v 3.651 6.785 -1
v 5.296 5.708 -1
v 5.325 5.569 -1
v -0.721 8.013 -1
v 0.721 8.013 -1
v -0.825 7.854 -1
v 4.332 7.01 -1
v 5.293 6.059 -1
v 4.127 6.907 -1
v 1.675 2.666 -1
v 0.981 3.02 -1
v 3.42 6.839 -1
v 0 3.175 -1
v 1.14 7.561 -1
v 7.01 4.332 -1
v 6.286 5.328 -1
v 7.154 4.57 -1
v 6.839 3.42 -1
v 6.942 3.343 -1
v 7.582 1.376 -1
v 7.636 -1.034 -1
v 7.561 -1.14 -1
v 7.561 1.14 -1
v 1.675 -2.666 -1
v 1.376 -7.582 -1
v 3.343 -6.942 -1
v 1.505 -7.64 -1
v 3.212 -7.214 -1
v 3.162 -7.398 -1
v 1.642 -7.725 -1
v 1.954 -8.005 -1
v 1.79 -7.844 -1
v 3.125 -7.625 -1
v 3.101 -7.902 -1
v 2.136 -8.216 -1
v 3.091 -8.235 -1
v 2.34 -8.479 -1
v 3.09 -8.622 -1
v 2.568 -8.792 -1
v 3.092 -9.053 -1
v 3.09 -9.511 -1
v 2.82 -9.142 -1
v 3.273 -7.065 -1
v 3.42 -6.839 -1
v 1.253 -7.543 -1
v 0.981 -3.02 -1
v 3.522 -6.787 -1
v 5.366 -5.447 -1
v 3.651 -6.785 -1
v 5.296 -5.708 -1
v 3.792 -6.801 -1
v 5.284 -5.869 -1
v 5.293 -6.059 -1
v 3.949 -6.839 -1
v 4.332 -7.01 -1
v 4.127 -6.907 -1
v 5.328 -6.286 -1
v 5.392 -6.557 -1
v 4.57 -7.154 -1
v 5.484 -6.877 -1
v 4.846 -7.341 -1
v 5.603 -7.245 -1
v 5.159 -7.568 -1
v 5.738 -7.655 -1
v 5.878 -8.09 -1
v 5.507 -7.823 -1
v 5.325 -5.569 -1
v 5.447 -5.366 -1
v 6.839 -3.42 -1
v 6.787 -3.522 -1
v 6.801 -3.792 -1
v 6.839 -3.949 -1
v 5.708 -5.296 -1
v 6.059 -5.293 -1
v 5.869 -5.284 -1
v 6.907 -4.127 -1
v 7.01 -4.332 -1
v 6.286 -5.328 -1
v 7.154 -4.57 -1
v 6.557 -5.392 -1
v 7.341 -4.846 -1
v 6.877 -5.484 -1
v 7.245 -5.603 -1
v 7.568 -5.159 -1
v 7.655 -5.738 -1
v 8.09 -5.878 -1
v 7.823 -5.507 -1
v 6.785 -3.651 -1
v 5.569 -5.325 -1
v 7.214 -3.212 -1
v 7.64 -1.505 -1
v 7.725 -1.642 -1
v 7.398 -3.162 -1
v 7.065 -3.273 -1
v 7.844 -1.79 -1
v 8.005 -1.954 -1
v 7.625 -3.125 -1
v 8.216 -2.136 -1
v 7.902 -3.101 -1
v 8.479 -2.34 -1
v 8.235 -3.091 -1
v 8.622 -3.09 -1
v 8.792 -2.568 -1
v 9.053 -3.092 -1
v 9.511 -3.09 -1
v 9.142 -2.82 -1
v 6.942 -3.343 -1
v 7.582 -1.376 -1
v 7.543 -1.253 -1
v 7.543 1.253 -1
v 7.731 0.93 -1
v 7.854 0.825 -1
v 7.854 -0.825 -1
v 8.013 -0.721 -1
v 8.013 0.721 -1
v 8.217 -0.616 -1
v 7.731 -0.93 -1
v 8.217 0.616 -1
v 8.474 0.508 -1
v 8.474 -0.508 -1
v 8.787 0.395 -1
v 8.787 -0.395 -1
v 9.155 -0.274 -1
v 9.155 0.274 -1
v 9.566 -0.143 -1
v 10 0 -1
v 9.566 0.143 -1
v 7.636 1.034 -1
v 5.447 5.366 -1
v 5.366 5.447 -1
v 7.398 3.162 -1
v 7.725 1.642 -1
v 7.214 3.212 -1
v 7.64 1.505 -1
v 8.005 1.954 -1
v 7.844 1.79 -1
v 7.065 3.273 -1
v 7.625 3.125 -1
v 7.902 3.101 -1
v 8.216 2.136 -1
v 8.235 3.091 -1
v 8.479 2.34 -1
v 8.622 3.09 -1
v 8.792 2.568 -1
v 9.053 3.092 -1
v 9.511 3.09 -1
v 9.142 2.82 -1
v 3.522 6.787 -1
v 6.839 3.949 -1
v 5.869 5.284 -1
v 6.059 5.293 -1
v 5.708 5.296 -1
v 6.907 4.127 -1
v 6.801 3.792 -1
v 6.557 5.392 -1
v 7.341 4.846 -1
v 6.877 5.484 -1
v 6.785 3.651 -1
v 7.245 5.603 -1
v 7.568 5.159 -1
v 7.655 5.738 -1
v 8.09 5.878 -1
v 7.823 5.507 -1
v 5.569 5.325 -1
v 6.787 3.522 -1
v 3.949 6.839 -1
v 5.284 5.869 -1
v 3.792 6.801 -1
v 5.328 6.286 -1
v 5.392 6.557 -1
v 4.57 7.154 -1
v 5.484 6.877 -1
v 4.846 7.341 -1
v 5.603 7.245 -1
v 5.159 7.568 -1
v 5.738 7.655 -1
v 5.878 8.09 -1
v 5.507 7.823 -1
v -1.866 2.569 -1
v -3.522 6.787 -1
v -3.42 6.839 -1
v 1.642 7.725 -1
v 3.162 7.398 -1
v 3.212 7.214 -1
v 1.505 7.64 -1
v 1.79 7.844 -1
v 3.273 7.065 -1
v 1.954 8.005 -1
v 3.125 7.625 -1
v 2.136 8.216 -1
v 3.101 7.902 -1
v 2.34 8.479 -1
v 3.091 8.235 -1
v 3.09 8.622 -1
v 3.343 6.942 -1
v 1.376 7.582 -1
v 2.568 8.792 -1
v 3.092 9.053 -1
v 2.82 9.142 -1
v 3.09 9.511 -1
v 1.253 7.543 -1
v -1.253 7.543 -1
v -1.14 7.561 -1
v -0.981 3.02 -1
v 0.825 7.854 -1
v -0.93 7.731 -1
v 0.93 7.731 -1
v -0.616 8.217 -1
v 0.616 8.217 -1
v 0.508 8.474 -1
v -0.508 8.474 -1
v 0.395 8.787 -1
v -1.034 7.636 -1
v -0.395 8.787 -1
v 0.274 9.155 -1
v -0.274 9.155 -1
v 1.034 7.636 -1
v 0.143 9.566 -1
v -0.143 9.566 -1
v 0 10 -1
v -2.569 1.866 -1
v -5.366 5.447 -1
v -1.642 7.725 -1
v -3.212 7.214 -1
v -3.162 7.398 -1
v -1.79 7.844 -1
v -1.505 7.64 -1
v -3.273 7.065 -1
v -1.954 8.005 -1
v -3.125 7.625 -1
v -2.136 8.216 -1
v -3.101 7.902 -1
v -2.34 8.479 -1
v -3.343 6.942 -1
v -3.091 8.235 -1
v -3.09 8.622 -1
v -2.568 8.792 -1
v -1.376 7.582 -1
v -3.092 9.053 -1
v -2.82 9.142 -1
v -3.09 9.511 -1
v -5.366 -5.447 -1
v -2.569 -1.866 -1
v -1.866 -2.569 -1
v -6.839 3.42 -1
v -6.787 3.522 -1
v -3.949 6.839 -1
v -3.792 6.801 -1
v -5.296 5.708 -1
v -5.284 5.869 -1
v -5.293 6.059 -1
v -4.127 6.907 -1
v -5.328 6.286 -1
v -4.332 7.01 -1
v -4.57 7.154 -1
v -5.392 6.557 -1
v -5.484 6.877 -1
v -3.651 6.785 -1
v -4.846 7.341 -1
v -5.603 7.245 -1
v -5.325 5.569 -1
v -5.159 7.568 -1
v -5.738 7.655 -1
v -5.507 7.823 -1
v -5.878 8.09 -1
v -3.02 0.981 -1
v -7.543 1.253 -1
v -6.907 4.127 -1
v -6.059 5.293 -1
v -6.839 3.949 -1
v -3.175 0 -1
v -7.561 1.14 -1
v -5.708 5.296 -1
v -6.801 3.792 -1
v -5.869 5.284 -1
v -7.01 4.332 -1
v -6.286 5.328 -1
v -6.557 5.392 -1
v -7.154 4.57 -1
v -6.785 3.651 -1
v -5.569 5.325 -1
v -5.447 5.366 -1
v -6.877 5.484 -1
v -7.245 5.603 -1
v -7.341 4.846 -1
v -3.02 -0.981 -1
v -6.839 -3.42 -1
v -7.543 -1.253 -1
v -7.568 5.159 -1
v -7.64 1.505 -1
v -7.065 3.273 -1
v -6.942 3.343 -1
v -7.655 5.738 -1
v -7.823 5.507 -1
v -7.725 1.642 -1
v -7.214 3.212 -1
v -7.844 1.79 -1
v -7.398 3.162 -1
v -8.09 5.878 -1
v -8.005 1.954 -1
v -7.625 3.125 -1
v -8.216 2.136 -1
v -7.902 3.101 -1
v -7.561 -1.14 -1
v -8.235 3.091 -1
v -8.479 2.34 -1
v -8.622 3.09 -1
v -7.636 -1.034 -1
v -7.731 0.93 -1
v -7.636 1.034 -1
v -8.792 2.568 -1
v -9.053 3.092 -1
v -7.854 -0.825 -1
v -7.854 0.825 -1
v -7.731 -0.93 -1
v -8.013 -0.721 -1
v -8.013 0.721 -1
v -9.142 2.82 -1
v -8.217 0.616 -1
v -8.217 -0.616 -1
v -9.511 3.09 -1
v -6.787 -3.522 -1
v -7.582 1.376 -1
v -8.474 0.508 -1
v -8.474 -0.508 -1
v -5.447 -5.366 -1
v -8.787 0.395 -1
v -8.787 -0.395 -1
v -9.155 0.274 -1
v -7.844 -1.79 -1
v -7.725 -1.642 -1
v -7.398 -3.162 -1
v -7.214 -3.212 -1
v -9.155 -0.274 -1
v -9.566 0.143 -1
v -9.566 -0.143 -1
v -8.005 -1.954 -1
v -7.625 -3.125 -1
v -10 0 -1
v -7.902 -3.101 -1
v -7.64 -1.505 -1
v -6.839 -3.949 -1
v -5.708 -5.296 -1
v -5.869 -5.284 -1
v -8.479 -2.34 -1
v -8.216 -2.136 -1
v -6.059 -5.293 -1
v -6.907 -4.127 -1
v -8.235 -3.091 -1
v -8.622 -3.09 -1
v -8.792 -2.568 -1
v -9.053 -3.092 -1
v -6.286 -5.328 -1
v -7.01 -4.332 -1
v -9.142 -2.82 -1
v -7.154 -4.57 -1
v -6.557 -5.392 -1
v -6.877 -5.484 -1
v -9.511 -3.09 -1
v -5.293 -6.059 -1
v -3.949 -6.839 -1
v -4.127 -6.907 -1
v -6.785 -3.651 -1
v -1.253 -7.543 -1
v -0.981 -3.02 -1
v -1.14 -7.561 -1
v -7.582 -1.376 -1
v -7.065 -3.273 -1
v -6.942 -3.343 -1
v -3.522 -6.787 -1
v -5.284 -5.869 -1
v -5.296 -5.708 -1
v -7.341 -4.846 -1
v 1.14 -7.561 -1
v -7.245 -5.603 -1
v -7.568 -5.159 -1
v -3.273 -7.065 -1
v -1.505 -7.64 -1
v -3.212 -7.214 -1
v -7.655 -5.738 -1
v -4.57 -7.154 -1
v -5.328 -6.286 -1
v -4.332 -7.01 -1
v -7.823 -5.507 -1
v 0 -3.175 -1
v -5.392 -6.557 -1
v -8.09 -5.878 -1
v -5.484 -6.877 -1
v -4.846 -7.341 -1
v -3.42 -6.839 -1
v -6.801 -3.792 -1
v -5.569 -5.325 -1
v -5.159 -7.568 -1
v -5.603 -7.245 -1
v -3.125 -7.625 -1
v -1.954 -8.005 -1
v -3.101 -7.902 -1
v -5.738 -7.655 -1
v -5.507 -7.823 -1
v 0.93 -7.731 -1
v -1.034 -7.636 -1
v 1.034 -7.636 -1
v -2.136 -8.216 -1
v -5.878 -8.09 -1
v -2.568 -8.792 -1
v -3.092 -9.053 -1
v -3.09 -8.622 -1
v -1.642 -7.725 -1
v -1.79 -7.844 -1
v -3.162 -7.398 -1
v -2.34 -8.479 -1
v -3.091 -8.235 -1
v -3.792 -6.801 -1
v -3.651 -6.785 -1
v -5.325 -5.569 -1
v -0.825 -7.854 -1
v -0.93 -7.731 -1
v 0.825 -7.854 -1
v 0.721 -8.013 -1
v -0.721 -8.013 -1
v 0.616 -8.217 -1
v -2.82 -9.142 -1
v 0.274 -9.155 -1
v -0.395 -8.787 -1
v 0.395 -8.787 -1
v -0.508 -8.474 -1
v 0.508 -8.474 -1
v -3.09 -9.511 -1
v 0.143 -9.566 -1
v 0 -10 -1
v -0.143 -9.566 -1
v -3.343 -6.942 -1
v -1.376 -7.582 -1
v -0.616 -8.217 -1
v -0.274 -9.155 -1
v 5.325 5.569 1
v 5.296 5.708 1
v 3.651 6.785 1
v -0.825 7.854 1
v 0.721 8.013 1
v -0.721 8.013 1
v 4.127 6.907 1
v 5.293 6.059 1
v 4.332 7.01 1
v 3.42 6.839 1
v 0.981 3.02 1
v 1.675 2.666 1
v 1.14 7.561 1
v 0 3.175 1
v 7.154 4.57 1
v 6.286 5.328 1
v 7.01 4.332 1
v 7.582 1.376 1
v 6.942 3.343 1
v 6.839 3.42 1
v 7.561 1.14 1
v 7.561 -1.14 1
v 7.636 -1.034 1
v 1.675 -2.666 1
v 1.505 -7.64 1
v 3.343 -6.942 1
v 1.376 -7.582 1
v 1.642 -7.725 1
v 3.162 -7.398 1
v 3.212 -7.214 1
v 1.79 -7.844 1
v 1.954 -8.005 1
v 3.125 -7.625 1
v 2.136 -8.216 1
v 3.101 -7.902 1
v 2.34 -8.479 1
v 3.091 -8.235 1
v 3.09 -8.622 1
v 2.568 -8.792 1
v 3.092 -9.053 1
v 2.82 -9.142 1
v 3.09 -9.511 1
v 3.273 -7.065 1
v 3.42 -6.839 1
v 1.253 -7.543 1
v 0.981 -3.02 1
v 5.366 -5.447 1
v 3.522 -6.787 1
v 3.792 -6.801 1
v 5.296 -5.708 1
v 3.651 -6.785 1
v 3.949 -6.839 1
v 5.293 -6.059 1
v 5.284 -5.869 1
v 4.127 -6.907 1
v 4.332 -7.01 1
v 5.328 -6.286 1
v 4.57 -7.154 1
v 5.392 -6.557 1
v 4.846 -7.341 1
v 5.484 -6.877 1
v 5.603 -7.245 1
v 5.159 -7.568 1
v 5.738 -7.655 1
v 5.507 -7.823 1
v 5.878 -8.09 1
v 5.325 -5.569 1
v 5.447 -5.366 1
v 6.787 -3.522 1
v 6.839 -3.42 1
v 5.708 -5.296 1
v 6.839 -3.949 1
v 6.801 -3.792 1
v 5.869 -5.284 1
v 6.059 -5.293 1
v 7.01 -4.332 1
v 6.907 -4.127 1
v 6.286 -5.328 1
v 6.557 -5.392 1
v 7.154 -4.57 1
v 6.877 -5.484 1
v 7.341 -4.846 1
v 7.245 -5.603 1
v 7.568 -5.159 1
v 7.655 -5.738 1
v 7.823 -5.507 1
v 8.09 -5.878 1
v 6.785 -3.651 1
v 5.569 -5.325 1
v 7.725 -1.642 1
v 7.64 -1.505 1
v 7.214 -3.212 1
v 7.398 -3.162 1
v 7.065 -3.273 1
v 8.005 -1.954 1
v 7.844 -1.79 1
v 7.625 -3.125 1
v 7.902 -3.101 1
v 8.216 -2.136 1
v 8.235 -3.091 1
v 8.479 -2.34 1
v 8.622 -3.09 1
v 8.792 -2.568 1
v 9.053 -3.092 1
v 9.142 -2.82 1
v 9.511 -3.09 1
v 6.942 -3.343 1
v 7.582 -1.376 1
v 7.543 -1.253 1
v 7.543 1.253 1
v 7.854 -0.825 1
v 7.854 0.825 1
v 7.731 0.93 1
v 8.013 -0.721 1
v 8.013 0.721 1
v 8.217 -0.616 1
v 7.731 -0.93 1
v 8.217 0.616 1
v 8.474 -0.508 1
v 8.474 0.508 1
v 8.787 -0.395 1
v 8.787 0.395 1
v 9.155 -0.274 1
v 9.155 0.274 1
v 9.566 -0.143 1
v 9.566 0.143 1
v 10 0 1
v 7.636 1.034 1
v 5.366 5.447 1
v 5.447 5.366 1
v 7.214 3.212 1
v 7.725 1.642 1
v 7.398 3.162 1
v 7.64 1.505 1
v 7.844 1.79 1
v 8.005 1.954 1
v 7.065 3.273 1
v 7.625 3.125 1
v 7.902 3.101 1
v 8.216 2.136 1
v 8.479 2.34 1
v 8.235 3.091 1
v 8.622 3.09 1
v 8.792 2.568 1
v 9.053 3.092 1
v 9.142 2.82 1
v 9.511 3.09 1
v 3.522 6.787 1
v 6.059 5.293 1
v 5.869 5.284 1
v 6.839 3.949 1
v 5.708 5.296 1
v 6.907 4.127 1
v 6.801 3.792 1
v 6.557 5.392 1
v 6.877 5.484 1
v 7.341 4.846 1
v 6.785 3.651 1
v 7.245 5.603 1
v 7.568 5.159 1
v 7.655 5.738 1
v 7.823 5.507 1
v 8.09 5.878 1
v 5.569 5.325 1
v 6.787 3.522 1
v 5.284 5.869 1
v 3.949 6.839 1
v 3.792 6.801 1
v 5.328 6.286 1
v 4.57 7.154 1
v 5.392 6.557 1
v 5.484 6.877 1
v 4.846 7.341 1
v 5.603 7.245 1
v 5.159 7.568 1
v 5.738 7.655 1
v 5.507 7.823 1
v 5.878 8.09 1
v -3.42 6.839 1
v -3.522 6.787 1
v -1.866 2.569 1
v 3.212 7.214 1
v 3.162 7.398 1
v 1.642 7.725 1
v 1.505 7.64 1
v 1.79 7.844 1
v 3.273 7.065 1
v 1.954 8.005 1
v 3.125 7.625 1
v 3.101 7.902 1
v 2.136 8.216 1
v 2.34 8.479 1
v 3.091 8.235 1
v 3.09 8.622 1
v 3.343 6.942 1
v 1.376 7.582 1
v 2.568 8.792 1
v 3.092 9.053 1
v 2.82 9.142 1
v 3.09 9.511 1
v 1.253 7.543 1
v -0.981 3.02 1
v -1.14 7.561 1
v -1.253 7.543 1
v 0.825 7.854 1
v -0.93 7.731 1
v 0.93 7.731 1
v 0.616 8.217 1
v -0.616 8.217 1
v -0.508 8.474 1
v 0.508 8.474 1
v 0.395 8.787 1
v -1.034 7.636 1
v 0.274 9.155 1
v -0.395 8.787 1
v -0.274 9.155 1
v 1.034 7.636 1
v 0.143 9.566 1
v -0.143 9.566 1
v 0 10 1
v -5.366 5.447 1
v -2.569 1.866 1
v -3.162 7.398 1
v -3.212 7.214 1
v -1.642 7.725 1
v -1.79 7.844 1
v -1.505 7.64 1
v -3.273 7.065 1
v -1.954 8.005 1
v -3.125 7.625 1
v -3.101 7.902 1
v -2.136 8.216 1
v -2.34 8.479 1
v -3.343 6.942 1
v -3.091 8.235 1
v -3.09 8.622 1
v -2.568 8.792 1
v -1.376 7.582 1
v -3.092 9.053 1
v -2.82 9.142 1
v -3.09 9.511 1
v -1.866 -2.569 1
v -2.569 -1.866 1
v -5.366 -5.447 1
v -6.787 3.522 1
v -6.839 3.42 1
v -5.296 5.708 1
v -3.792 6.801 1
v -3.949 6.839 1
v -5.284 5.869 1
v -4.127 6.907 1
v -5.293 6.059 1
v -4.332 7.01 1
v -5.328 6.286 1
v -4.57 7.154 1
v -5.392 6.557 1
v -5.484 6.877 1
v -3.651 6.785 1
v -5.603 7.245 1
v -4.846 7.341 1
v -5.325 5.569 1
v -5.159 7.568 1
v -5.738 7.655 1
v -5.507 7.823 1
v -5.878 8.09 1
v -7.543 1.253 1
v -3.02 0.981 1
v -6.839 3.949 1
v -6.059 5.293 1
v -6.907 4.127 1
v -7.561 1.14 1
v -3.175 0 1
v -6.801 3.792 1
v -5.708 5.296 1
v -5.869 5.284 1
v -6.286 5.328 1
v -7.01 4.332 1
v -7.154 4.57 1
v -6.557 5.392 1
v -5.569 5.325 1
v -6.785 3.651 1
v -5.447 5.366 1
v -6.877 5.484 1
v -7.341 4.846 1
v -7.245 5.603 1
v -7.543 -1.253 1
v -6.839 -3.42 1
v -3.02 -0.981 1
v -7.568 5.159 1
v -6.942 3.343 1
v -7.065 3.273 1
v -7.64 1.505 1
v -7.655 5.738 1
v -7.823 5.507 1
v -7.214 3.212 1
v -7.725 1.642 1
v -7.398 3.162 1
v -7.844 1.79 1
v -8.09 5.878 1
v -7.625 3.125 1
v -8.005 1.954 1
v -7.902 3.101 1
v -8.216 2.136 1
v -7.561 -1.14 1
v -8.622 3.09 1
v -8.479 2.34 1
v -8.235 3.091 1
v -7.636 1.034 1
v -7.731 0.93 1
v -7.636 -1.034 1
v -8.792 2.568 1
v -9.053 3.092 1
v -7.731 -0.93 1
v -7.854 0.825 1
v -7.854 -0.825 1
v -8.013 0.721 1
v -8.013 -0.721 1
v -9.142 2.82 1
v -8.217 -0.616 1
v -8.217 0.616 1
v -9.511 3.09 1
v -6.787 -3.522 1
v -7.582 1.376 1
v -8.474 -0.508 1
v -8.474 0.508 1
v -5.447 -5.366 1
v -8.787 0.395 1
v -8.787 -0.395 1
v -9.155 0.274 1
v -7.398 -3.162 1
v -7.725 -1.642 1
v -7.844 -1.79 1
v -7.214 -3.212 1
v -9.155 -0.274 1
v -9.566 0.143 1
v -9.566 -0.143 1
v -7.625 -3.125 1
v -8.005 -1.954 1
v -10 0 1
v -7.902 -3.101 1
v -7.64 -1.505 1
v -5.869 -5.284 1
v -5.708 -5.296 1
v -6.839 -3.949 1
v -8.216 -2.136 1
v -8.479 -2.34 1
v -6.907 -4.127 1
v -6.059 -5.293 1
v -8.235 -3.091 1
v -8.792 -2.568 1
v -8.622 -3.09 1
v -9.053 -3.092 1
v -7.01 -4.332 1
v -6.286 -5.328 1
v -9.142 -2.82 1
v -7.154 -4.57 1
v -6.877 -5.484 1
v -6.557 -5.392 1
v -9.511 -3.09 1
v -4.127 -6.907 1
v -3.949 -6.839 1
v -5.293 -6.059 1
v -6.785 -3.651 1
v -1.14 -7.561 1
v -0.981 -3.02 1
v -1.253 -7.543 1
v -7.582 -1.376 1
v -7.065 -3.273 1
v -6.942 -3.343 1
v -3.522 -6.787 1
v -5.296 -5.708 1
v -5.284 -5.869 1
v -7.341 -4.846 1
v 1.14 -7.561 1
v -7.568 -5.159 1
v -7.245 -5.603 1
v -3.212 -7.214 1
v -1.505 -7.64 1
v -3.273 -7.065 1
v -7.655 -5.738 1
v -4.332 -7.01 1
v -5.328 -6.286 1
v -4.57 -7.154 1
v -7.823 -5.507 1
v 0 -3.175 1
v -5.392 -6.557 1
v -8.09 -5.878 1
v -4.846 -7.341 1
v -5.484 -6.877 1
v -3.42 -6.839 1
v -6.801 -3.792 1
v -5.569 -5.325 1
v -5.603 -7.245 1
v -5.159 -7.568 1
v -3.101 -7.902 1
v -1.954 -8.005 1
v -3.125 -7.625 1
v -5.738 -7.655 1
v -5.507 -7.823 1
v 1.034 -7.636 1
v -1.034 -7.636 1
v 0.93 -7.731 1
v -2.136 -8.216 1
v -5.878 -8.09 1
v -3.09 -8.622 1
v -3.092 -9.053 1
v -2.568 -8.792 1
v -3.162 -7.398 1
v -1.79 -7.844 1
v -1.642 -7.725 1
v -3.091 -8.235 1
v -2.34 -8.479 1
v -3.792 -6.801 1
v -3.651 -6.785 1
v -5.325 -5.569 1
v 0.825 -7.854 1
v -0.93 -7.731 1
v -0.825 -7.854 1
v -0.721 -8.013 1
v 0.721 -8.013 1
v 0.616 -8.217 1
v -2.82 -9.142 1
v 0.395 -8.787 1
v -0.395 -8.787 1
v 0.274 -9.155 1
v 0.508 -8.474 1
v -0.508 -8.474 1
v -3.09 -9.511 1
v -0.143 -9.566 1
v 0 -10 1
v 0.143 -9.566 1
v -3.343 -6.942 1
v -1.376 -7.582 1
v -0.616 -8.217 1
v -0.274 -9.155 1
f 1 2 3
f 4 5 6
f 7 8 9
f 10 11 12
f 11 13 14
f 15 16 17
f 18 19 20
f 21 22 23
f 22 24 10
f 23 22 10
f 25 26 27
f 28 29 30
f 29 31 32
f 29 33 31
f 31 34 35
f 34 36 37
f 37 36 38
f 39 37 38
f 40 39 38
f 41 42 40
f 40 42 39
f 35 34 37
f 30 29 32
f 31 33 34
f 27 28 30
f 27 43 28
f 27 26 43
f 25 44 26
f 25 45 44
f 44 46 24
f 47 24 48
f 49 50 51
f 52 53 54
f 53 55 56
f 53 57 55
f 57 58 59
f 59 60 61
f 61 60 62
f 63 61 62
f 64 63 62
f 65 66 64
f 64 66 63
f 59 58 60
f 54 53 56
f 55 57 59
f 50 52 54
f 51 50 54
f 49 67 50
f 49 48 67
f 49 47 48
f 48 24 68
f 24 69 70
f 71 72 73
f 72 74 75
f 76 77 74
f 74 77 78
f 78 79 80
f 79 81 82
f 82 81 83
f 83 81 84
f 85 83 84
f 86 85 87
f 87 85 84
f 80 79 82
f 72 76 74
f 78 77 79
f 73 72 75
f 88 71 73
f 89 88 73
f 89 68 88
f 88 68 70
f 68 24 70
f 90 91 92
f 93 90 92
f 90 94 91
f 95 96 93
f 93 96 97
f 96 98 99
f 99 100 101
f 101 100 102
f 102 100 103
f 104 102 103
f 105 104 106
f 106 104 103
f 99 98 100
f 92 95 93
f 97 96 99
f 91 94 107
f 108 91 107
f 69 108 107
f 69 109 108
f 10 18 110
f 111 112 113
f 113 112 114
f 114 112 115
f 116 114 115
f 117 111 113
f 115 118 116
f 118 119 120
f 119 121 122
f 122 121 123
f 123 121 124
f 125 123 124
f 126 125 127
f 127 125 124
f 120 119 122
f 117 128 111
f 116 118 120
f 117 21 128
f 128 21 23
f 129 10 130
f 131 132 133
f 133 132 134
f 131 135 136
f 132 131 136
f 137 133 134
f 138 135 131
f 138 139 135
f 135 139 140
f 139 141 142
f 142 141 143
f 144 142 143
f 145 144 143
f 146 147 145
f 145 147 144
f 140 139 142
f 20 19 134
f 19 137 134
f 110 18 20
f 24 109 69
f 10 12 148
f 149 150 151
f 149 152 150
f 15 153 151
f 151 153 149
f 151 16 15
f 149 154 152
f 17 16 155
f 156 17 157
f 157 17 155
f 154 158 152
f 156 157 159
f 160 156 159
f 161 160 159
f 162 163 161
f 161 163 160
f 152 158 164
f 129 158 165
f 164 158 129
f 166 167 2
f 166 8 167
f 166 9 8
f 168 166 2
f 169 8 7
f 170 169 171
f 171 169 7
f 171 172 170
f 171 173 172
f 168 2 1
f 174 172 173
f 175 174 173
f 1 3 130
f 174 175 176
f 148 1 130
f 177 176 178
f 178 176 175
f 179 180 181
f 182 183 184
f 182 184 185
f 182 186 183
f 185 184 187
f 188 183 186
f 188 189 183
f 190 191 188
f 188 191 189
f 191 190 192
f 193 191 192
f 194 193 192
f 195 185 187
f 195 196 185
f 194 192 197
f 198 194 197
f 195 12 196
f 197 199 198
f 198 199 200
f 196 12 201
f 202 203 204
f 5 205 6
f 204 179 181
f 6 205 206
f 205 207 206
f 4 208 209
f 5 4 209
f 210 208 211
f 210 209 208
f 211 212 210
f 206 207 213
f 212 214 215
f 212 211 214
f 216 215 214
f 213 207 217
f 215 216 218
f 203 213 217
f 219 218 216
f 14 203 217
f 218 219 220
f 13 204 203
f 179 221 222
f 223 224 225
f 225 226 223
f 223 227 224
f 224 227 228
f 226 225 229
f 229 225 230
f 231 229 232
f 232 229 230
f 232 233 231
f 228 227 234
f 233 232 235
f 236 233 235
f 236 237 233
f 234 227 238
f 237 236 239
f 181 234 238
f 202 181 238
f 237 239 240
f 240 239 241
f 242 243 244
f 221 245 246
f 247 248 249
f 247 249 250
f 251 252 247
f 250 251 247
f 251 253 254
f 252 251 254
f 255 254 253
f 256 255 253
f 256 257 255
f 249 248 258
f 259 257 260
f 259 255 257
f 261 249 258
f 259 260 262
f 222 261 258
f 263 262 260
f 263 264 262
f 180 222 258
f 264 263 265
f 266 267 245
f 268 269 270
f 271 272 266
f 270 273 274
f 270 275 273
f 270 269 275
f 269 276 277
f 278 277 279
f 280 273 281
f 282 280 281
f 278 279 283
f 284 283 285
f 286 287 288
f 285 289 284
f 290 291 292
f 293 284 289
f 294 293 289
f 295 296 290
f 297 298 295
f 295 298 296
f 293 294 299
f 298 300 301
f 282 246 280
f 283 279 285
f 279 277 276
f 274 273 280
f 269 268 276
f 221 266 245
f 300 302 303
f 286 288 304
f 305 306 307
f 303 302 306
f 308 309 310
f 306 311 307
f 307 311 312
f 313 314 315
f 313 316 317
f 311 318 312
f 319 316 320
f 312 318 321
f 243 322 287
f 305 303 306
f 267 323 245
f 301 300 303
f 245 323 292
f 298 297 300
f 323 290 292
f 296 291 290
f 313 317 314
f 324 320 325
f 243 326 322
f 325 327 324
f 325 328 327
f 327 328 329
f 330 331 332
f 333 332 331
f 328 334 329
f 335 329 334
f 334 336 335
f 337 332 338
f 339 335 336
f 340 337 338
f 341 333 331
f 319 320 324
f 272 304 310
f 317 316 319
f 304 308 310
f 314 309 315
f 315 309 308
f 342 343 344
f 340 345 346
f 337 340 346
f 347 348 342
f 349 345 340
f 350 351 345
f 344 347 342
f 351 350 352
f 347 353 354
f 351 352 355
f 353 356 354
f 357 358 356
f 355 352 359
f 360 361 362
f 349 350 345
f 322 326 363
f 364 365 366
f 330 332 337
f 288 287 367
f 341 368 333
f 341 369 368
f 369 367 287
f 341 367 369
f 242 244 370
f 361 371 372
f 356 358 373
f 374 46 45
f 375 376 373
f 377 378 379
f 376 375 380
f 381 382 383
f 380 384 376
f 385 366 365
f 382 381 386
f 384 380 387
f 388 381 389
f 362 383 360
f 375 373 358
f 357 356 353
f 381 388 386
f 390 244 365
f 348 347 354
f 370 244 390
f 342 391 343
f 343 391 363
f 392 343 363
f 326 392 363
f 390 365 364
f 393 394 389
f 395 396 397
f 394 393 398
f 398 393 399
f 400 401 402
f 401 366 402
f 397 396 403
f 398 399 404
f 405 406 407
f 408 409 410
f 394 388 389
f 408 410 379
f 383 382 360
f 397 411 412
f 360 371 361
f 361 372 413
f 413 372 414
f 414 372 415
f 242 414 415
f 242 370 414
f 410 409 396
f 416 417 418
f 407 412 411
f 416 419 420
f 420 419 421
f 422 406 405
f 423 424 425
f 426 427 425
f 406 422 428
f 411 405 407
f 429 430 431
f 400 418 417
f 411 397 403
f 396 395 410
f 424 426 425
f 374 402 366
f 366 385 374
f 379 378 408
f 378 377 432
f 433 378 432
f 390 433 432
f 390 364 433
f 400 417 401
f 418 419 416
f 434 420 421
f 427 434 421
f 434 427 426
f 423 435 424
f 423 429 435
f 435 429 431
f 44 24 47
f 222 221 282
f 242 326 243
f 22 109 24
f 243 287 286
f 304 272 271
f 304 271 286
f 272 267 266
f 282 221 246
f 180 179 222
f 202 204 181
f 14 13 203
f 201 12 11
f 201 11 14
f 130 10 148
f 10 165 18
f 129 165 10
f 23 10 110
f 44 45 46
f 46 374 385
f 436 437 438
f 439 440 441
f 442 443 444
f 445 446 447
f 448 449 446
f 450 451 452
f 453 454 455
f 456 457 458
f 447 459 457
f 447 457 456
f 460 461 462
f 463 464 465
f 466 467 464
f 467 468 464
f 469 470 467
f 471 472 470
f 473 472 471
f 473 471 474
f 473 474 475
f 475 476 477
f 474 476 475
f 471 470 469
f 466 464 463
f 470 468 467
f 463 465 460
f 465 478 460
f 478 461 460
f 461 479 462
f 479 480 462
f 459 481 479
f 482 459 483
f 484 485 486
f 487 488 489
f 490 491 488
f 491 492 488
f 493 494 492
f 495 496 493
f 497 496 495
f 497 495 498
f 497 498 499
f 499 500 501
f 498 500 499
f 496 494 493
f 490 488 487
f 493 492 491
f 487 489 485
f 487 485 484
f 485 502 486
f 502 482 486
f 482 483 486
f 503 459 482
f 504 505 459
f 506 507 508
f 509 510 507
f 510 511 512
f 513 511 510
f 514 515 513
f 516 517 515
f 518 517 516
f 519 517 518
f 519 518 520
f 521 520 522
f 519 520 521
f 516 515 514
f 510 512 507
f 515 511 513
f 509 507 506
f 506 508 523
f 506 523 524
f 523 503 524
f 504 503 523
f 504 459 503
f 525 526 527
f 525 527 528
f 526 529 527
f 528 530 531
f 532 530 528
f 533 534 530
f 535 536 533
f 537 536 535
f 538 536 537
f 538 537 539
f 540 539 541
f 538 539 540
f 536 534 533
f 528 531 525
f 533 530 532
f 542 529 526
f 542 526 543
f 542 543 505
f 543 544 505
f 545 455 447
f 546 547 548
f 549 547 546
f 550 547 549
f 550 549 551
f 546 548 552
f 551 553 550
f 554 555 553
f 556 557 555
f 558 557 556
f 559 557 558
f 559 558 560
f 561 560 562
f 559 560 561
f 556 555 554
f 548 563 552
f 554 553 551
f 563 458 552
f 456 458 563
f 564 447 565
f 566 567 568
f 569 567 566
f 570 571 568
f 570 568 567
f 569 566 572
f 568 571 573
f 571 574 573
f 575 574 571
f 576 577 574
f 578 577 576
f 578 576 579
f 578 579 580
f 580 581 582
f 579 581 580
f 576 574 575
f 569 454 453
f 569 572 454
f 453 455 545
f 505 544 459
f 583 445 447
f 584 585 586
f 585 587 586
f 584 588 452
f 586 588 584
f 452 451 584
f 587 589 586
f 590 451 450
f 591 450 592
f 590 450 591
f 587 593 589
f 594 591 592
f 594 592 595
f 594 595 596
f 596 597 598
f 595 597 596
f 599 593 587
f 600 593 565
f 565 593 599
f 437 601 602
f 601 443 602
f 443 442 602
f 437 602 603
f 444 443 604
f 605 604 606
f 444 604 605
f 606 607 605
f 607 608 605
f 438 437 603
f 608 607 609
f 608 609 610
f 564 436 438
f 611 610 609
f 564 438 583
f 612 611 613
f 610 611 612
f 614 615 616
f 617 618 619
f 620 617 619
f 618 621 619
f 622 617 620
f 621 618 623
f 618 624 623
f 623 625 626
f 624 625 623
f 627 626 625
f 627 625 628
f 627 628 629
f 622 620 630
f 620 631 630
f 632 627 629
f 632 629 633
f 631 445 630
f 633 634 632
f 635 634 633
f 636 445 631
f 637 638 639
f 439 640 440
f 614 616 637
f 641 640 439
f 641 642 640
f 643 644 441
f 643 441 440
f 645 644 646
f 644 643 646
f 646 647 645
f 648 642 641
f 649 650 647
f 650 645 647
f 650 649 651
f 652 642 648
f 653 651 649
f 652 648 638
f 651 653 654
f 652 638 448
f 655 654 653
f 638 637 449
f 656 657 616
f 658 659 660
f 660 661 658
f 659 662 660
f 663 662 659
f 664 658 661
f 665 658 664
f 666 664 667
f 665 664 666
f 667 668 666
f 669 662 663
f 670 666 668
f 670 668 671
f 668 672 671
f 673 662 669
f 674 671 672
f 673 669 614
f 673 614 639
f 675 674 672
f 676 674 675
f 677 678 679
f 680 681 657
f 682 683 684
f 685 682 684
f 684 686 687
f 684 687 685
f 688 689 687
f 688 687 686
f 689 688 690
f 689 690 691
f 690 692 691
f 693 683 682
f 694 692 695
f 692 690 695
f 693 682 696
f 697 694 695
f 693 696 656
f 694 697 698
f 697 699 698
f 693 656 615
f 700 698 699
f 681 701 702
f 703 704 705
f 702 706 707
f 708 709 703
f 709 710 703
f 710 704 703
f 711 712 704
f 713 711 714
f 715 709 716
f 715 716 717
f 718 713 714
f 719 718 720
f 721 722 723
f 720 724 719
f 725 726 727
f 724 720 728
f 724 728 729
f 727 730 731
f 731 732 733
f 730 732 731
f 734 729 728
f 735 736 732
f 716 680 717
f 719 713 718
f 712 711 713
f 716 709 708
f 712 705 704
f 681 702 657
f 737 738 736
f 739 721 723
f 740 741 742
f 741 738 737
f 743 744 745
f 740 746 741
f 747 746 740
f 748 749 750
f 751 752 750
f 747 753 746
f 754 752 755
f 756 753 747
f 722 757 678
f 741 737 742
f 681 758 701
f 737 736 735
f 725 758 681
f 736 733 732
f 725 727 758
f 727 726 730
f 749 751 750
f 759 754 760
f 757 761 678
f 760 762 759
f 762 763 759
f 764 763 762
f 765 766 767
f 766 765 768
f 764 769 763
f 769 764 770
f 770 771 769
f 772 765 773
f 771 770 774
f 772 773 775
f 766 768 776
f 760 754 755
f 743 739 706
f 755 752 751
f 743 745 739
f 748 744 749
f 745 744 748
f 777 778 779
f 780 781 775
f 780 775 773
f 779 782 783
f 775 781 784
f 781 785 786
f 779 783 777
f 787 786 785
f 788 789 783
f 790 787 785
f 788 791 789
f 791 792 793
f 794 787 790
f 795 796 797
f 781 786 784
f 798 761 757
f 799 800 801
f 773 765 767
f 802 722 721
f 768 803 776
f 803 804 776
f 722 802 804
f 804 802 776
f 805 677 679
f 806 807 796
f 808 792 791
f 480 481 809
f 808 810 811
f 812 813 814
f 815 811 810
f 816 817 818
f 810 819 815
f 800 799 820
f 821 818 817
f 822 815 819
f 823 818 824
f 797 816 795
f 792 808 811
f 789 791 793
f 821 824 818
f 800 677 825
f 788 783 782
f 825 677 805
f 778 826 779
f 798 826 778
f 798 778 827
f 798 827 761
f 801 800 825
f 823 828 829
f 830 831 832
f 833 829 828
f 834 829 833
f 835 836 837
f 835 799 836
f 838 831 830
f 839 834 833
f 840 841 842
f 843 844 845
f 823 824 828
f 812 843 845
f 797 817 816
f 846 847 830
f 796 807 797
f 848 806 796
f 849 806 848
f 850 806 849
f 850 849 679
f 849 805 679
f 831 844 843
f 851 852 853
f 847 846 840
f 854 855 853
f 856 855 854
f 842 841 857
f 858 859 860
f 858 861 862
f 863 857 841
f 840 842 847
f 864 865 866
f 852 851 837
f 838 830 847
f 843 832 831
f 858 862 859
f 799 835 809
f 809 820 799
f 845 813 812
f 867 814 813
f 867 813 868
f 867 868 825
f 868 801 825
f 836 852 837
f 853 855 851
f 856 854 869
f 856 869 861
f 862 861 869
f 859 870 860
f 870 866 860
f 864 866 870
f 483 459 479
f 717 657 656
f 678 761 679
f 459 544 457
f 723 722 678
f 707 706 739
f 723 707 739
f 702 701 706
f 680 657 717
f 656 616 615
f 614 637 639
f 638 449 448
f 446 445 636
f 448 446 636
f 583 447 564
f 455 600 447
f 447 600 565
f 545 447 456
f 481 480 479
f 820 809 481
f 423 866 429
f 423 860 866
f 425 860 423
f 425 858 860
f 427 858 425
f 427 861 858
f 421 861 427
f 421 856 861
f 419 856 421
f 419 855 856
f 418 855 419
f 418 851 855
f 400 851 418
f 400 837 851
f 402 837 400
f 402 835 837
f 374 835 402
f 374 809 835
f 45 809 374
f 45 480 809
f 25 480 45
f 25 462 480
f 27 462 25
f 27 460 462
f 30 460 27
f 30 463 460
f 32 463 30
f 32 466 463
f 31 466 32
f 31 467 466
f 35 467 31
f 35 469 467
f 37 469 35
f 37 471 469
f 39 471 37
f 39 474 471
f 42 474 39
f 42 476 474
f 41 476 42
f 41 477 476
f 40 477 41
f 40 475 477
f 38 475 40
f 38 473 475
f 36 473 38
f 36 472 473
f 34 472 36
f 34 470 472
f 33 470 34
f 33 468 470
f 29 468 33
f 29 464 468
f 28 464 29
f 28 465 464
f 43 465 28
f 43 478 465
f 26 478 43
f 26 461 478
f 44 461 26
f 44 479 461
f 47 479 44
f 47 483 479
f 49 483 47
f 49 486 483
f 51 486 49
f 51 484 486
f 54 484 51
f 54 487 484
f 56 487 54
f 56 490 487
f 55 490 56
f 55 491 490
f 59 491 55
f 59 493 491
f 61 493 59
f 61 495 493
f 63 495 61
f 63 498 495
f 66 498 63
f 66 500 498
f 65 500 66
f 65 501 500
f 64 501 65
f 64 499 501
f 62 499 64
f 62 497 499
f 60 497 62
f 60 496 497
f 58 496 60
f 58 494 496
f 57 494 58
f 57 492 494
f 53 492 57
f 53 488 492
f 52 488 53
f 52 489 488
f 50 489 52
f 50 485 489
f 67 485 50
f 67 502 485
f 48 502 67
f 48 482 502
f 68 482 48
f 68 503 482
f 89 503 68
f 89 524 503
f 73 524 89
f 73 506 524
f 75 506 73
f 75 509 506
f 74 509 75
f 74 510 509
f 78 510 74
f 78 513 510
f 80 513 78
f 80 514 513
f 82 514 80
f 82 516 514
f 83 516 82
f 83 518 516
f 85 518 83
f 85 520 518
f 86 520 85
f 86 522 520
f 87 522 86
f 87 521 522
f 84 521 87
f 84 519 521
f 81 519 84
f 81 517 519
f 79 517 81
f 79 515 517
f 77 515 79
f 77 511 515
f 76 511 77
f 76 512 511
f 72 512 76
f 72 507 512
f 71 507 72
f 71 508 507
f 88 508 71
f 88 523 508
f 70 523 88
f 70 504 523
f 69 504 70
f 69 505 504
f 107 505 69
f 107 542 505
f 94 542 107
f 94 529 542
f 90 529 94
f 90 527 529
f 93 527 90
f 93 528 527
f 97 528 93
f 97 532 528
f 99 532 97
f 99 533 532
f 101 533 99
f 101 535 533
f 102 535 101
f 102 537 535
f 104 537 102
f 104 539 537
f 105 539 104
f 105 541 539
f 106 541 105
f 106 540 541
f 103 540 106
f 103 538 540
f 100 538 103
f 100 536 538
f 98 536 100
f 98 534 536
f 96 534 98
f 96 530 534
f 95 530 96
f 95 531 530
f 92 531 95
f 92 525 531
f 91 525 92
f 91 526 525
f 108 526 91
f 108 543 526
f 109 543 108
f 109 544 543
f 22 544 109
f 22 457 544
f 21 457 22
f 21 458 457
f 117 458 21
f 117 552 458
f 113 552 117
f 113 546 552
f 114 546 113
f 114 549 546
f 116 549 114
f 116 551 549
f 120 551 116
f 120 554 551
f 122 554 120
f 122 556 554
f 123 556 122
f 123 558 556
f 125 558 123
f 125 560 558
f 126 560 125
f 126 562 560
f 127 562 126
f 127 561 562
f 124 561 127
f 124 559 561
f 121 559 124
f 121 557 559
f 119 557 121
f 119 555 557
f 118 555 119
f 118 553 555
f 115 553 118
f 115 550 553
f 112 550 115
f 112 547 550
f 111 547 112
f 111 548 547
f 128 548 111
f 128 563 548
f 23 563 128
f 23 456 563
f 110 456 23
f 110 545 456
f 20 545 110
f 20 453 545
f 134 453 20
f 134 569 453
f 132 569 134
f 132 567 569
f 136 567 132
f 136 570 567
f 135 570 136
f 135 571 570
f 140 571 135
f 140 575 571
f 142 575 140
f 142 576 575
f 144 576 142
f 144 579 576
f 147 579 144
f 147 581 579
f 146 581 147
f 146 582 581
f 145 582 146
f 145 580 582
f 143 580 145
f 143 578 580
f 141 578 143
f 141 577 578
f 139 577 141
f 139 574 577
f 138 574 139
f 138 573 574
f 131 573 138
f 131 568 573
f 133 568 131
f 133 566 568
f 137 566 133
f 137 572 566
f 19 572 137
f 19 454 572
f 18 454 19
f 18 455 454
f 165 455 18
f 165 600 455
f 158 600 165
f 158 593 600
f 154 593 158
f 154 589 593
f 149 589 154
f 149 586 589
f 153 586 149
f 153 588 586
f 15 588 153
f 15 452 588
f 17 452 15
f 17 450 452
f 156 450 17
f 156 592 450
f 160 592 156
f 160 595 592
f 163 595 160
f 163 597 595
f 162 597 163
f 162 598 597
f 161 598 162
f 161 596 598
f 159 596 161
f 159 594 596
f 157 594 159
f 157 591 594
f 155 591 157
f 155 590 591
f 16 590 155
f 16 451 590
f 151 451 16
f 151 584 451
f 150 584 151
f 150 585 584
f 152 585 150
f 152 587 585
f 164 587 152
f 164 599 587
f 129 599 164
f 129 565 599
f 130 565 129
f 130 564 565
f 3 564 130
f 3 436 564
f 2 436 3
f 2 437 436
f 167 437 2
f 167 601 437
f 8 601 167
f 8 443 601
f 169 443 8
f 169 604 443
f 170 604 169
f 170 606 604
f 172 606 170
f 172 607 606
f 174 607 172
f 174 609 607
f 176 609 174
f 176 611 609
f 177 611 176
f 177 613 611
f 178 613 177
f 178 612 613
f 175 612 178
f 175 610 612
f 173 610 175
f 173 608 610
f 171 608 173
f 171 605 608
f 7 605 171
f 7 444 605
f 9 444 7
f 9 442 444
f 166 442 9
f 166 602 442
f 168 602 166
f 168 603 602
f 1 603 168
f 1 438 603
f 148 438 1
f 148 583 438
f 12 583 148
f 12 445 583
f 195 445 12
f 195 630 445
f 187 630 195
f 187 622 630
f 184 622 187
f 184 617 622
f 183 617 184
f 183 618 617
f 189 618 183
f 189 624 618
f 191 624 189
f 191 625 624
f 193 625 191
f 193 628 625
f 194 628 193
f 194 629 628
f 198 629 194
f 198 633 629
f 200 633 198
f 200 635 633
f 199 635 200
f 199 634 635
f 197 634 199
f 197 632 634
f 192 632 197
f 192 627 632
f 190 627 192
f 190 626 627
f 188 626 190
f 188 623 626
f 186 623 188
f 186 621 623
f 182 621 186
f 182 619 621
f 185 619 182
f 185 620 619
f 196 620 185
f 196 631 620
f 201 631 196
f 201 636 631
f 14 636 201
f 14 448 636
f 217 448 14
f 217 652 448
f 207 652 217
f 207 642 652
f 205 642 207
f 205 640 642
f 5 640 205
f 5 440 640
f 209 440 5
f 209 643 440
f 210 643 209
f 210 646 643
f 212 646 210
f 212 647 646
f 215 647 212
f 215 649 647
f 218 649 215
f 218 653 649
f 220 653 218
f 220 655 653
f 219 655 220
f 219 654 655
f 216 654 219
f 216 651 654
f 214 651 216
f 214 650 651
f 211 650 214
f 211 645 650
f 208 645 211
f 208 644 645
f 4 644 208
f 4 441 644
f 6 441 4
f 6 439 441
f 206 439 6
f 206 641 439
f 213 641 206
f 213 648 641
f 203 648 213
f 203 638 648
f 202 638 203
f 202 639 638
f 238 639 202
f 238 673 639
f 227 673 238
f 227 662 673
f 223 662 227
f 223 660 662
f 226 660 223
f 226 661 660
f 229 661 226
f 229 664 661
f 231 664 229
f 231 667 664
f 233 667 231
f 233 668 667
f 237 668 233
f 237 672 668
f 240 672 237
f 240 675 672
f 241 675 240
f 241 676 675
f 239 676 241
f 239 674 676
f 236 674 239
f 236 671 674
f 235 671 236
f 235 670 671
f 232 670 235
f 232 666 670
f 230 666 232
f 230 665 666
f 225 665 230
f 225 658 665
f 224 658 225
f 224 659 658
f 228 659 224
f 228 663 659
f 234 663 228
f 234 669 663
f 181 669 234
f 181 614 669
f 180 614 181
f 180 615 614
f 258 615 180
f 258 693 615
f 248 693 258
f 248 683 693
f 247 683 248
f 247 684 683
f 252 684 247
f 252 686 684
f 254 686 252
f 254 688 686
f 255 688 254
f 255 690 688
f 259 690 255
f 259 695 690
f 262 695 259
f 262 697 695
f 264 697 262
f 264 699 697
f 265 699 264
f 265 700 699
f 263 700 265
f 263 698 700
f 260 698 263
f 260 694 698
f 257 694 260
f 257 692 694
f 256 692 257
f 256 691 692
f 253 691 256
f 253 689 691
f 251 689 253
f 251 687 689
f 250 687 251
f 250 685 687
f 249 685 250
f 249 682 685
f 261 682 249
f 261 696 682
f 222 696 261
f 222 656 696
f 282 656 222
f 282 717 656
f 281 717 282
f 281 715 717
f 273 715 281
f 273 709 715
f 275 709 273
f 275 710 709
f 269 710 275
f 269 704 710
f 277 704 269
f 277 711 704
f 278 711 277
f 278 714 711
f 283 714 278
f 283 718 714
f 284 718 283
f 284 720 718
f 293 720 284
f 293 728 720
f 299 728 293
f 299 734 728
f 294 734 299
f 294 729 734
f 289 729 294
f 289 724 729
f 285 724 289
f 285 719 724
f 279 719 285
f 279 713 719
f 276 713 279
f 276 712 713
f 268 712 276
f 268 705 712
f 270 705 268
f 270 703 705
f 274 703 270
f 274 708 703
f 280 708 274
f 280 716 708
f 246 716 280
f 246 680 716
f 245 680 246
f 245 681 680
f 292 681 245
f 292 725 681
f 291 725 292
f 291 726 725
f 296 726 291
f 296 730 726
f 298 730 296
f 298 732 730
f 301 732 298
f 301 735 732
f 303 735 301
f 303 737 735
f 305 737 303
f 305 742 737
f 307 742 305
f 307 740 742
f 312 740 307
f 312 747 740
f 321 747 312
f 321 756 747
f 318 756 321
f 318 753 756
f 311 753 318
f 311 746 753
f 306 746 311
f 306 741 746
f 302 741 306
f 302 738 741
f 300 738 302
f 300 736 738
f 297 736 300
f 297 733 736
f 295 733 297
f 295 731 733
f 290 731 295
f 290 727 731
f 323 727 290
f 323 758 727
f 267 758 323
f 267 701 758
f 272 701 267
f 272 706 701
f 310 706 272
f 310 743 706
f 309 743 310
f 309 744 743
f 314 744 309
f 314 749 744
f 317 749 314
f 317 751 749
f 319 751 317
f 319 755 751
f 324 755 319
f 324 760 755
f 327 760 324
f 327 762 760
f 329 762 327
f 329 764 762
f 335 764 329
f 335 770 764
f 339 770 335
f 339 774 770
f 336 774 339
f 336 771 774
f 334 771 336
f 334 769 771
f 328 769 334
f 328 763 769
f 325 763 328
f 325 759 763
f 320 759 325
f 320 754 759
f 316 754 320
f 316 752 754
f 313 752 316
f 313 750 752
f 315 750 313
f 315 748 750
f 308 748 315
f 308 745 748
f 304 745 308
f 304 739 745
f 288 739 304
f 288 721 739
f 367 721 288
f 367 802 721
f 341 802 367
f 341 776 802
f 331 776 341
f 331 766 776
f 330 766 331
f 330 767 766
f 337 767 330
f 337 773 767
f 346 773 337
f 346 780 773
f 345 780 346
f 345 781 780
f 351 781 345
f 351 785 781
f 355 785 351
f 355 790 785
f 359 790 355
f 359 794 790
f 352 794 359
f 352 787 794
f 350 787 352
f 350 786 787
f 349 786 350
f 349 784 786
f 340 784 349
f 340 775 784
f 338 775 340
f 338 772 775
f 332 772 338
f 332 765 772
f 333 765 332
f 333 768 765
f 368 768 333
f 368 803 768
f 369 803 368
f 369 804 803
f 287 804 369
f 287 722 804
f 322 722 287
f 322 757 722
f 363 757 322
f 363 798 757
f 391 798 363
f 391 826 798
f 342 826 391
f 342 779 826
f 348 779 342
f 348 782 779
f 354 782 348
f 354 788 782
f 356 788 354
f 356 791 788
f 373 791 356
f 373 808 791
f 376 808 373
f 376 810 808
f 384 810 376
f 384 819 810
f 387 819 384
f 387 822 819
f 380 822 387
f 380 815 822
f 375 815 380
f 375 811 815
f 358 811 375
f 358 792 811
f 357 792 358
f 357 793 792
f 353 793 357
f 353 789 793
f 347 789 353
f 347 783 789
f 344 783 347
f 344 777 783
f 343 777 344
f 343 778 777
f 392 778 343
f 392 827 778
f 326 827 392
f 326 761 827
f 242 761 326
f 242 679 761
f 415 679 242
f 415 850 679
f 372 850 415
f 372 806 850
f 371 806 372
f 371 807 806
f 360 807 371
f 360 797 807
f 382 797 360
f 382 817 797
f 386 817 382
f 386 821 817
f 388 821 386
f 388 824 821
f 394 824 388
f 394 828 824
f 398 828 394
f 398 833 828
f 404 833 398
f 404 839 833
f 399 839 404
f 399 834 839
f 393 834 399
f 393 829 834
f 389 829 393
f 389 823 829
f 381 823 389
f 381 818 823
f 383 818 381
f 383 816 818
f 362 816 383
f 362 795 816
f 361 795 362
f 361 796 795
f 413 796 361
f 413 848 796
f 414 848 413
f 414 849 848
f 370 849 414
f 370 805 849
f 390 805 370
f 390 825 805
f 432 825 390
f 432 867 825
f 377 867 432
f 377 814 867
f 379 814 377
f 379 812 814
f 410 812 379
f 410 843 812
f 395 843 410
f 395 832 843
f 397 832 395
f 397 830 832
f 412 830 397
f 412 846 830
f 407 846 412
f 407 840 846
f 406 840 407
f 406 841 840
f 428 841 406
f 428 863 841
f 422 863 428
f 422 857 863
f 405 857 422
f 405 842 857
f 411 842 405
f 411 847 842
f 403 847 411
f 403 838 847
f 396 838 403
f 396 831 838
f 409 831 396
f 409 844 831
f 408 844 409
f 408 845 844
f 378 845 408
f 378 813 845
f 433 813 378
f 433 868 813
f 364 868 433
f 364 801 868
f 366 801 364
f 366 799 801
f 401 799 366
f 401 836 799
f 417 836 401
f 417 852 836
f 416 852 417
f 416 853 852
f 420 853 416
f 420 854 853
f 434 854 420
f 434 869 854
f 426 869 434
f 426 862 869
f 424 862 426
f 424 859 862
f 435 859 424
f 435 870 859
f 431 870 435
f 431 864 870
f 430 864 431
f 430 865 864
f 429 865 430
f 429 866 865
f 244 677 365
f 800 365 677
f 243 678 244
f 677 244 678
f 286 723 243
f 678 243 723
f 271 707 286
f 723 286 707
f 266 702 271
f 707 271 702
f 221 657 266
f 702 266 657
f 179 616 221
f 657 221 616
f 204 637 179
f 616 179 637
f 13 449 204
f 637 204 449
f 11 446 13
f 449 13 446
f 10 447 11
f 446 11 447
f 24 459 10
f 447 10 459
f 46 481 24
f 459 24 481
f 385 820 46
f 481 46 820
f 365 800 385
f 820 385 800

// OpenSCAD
// file: pointy_polygon.scad
function logistic(x, k=1, g=3) = g * (1 / (1 + exp(-k * x)) - 1/2);

function r(rad, b, fn, k, g) = rad - logistic(min(b, fn + 1 - b), k, g);

function angle(a, b, verts, step) = a * 360 / verts + b * step;

module pointy(rad=3, fn = 2, verts=3, k=1, g=3) {
    step = 360 / ((fn + 1) * verts);
    points = concat(
        [for(a = [0 : verts - 1])
            for(b = [0 : fn])[
                r(rad, b, fn, k / fn, g) * cos(angle(a, b, verts, step)), r(rad, b, fn, k / fn, g) * sin(angle(a, b, verts, step))
            ]
        ]
    );
    echo([0 : 1 : verts]);
    polygon(points);
}

linear_extrude(height = 2, center = true, convexity = 10){
    pointy(verts=20, fn=20, k=7, g=5, rad=20);
}
// main file
use <pointy_polygon.scad>
linear_extrude(height=2, center = true, convexity = 10){
rad = 10;
difference(){
    pointy(verts=20, fn=20, k=7, g=5, rad=rad);
    union(){
        for (i = [0:19]){
            rotate(- i * 360/20){
                ts = 0;
                if (i > 9){
                    numlength = 2;
                    echo(numlength);
                    translate([-ts * (0.3*(numlength - 1) + 1/2), rad - 2 * ts - 2])
                    text(str(i), size=ts);
                }
                else{
                    numlength = 1;
                    echo(numlength);
                    translate([-ts * (0.3*(numlength - 1) + 1/2), rad - 2 * ts - 2])
                    text(str(i), size=ts);
                }
            }
        }
    };
    difference(){
        rad = 5.95/2;
        small_diam = 4.45;
        eps = 0.2;
        inwards = 2 * rad - small_diam;
        circle(rad + eps, $fn=20);
        translate([rad * 3/2 - inwards + eps, 0])
        square([rad, 3 * rad], center=true);
    }
}
}
